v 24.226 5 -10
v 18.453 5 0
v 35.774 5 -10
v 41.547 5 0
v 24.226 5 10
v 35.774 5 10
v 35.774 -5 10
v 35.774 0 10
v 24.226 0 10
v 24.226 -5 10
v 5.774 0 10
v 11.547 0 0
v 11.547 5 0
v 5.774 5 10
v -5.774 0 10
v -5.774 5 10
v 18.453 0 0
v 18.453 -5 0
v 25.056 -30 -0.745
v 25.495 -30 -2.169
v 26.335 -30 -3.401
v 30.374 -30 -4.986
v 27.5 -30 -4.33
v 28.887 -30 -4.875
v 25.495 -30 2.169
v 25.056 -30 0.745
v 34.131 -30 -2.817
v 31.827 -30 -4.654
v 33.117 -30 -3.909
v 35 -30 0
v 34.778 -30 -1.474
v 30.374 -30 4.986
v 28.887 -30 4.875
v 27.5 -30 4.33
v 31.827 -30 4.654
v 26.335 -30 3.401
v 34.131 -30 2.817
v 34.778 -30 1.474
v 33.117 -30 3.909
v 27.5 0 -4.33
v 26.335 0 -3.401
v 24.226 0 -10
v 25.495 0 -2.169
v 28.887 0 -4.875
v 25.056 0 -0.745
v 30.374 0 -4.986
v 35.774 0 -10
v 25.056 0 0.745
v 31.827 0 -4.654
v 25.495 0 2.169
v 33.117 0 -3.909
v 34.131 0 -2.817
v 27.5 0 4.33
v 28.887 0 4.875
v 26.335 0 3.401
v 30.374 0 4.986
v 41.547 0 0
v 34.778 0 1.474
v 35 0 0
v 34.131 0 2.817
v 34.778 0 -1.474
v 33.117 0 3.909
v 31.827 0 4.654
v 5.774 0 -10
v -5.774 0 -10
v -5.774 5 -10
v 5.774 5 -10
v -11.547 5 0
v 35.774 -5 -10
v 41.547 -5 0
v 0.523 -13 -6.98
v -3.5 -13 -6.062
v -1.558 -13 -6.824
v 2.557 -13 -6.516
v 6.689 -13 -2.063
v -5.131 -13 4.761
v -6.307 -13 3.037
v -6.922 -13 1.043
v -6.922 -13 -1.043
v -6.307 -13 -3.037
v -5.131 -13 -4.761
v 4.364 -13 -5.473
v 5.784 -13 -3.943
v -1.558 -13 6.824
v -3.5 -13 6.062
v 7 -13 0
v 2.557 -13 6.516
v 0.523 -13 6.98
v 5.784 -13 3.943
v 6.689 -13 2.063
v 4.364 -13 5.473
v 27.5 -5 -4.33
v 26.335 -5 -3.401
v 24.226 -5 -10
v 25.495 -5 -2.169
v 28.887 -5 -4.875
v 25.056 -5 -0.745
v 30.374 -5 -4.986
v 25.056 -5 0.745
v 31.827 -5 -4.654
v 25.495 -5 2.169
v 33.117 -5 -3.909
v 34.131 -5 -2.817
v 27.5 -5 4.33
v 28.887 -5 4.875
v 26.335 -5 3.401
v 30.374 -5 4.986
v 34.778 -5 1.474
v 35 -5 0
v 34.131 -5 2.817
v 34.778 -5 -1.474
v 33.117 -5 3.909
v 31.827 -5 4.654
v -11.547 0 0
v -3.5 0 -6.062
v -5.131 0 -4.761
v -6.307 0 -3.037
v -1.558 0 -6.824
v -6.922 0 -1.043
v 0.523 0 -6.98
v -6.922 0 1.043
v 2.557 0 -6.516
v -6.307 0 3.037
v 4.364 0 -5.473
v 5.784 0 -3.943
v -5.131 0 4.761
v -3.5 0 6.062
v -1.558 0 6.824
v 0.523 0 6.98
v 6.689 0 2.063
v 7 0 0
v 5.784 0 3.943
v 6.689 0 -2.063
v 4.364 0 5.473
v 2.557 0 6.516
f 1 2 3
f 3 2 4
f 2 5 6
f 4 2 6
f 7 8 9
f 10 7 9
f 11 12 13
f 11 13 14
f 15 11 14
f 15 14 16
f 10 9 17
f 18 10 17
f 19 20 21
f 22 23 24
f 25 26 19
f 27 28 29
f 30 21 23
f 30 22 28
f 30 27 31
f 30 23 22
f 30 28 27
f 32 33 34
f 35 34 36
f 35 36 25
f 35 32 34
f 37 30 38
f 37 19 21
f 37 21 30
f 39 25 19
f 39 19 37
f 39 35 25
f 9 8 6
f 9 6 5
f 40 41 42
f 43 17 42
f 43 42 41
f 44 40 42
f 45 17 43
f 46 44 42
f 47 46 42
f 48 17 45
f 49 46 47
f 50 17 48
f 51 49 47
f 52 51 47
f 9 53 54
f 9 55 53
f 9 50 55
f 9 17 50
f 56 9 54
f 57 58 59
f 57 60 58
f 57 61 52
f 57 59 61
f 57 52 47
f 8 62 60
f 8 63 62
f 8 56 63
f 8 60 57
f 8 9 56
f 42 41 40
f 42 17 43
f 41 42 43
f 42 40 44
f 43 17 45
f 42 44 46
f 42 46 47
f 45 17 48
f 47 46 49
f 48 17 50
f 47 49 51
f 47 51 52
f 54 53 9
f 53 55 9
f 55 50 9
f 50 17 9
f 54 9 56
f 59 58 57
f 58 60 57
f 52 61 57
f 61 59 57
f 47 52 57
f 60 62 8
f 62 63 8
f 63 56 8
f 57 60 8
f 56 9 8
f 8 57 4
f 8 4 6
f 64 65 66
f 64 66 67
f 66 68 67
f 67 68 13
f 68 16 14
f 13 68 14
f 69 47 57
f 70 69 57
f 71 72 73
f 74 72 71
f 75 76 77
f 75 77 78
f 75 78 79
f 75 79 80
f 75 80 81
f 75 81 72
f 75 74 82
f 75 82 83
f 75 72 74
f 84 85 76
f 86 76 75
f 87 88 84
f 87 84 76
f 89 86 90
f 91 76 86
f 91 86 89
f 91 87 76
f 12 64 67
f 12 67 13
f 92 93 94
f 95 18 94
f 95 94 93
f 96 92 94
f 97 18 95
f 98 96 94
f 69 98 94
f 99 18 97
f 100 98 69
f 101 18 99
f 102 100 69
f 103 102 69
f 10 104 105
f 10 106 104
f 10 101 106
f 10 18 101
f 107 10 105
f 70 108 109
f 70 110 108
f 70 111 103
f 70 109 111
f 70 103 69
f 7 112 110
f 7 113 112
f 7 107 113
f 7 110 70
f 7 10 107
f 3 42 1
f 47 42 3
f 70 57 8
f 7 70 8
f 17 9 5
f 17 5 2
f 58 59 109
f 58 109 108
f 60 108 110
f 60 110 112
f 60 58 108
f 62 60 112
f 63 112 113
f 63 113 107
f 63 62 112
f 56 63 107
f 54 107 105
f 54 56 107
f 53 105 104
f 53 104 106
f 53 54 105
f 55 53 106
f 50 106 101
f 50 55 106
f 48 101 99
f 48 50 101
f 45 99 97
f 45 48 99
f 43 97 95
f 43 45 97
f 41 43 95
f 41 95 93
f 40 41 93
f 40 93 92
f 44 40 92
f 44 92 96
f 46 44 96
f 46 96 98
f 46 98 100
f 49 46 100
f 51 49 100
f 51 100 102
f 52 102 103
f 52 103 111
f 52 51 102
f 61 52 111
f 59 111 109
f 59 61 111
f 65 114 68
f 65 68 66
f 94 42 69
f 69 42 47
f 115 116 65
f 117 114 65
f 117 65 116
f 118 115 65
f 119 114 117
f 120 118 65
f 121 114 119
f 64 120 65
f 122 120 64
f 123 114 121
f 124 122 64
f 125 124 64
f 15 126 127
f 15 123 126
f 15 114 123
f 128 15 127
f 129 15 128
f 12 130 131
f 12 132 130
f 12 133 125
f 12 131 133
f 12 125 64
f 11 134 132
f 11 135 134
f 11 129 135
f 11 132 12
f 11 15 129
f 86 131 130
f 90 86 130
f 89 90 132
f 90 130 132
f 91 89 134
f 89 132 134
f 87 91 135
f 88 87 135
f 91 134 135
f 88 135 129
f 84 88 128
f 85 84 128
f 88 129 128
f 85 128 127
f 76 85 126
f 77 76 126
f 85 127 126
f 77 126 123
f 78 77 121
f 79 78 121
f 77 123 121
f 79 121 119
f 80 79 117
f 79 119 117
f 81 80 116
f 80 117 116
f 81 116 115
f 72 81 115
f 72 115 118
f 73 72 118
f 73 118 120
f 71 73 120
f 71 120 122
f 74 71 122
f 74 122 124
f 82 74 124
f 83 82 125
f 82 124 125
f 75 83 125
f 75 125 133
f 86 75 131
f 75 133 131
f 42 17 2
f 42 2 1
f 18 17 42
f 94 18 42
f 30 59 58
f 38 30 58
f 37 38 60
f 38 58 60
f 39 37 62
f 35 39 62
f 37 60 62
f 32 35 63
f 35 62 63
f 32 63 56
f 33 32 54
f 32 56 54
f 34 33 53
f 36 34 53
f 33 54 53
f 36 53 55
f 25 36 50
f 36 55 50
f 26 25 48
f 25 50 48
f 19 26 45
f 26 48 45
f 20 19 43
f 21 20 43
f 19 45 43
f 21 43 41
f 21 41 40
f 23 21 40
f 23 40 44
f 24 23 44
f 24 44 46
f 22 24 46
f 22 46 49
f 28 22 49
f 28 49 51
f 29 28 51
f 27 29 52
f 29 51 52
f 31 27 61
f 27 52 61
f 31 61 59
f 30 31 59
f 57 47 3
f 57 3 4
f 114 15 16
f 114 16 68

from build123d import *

# Parameters (mm, degrees)
F0_R     = 5
F1_DEPTH = 30
F0_R_2   = 7
F2_DEPTH = 13
F3_DEPTH = 5
F4_DEPTH = 5


with BuildPart() as f1:
    # F0 (on Front) → F1 (new body)
    with BuildSketch(Plane.XZ):
        with Locations((30, 0)):
            Circle(F0_R)
    extrude(amount=F1_DEPTH)



with BuildPart() as f2:
    # F0 (on Front) → F2 (new body)
    with BuildSketch(Plane.XZ):
        Circle(F0_R_2)
    extrude(amount=F2_DEPTH)


with BuildPart() as f1_1:
    add(f1.part)

    add(f2.part)  # F3 merges F2
    # F0 (on Front) → F3 (join)
    with BuildSketch(Plane.XZ):
        Polygon((5.773503, 10), (-5.773503, 10), (-11.547005, 0), (-5.773503, -10), (5.773503, -10), (11.547005, 0), align=None)
        Circle(F0_R_2, mode=Mode.SUBTRACT)
        Circle(F0_R_2)
        Polygon((35.773503, 10), (24.226497, 10), (18.452995, 0), (24.226497, -10), (35.773503, -10), (41.547005, 0), align=None)
        with Locations((30, 0)):
            Circle(F0_R, mode=Mode.SUBTRACT)
        with Locations((30, 0)):
            Circle(F0_R)
    extrude(amount=-F3_DEPTH)


with BuildPart() as f4:
    # F0 (on Front) → F4 (new body)
    with BuildSketch(Plane.XZ):
        Polygon((35.773503, 10), (24.226497, 10), (18.452995, 0), (24.226497, -10), (35.773503, -10), (41.547005, 0), align=None)
        with Locations((30, 0)):
            Circle(F0_R, mode=Mode.SUBTRACT)
    extrude(amount=F4_DEPTH)


solid = Compound([f1_1.part, f4.part])
